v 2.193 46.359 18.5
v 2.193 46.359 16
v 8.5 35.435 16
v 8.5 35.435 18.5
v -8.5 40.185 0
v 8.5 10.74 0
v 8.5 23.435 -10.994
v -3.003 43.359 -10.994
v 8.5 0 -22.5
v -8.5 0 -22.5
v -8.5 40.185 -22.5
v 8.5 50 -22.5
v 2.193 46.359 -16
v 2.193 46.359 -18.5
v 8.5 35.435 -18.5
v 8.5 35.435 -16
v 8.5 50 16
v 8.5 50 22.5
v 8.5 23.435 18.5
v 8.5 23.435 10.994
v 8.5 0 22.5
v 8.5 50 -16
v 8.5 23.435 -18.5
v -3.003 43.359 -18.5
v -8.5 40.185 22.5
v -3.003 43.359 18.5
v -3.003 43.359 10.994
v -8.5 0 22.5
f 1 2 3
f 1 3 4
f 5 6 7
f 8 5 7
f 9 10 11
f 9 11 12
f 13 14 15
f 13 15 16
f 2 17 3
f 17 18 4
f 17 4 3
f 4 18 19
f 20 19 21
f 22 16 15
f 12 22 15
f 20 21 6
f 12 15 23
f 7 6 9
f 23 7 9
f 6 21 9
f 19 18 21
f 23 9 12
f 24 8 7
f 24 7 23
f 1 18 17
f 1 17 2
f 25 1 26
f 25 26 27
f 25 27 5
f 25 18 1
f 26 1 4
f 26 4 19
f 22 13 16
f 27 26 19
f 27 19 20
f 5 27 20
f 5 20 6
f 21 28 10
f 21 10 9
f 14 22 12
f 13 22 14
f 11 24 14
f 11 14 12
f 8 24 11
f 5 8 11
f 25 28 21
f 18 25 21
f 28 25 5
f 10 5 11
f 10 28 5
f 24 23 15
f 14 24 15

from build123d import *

# Parameters (mm, degrees)
SKETCH1_W           = 17
SKETCH1_H           = 45
BOSS_EXTRUDE1_DEPTH = 50
CUT_EXTRUDE1_DEPTH  = 68.803023531
CUT_EXTRUDE3_DEPTH  = 50.350151975


with BuildPart() as part:
    # Sketch1 → Boss-Extrude1 (new body)
    with BuildSketch(Plane(origin=(0, 0, 0), x_dir=(1, 0, 0), z_dir=(0, 1, 0))):
        Rectangle(SKETCH1_W, SKETCH1_H)
    extrude(amount=BOSS_EXTRUDE1_DEPTH)

    # Sketch2 → Cut-Extrude1 (cut, through all)
    with BuildSketch(Plane.XY.offset(22.5)):
        Polygon((8.5, 50), (-8.5, 40.185045424), (-8.5, 50), align=None)
    extrude(amount=-CUT_EXTRUDE1_DEPTH, mode=Mode.SUBTRACT)

    # Sketch3 → Cut-Extrude3 (cut, through all)
    with BuildSketch(Plane(origin=(-19.525635095, 33.819392034, 0), x_dir=(0.8660254037844417, 0.4999999999999949, 0), z_dir=(-0.4999999999999949, 0.8660254037844417, 0))):
        Polygon((25.078911087, -18.5), (19.078911087, -18.5), (19.078911087, -10.994373166), (12.73130678, 0), (19.078911087, 10.994373166), (19.078911087, 18.5), (25.078911087, 18.5), (25.078911087, 16), (40.444119701, 16), (49.681724008, 0), (40.444119701, -16), (25.078911087, -16), align=None)
    extrude(amount=-CUT_EXTRUDE3_DEPTH, mode=Mode.SUBTRACT)


solid = part.part
